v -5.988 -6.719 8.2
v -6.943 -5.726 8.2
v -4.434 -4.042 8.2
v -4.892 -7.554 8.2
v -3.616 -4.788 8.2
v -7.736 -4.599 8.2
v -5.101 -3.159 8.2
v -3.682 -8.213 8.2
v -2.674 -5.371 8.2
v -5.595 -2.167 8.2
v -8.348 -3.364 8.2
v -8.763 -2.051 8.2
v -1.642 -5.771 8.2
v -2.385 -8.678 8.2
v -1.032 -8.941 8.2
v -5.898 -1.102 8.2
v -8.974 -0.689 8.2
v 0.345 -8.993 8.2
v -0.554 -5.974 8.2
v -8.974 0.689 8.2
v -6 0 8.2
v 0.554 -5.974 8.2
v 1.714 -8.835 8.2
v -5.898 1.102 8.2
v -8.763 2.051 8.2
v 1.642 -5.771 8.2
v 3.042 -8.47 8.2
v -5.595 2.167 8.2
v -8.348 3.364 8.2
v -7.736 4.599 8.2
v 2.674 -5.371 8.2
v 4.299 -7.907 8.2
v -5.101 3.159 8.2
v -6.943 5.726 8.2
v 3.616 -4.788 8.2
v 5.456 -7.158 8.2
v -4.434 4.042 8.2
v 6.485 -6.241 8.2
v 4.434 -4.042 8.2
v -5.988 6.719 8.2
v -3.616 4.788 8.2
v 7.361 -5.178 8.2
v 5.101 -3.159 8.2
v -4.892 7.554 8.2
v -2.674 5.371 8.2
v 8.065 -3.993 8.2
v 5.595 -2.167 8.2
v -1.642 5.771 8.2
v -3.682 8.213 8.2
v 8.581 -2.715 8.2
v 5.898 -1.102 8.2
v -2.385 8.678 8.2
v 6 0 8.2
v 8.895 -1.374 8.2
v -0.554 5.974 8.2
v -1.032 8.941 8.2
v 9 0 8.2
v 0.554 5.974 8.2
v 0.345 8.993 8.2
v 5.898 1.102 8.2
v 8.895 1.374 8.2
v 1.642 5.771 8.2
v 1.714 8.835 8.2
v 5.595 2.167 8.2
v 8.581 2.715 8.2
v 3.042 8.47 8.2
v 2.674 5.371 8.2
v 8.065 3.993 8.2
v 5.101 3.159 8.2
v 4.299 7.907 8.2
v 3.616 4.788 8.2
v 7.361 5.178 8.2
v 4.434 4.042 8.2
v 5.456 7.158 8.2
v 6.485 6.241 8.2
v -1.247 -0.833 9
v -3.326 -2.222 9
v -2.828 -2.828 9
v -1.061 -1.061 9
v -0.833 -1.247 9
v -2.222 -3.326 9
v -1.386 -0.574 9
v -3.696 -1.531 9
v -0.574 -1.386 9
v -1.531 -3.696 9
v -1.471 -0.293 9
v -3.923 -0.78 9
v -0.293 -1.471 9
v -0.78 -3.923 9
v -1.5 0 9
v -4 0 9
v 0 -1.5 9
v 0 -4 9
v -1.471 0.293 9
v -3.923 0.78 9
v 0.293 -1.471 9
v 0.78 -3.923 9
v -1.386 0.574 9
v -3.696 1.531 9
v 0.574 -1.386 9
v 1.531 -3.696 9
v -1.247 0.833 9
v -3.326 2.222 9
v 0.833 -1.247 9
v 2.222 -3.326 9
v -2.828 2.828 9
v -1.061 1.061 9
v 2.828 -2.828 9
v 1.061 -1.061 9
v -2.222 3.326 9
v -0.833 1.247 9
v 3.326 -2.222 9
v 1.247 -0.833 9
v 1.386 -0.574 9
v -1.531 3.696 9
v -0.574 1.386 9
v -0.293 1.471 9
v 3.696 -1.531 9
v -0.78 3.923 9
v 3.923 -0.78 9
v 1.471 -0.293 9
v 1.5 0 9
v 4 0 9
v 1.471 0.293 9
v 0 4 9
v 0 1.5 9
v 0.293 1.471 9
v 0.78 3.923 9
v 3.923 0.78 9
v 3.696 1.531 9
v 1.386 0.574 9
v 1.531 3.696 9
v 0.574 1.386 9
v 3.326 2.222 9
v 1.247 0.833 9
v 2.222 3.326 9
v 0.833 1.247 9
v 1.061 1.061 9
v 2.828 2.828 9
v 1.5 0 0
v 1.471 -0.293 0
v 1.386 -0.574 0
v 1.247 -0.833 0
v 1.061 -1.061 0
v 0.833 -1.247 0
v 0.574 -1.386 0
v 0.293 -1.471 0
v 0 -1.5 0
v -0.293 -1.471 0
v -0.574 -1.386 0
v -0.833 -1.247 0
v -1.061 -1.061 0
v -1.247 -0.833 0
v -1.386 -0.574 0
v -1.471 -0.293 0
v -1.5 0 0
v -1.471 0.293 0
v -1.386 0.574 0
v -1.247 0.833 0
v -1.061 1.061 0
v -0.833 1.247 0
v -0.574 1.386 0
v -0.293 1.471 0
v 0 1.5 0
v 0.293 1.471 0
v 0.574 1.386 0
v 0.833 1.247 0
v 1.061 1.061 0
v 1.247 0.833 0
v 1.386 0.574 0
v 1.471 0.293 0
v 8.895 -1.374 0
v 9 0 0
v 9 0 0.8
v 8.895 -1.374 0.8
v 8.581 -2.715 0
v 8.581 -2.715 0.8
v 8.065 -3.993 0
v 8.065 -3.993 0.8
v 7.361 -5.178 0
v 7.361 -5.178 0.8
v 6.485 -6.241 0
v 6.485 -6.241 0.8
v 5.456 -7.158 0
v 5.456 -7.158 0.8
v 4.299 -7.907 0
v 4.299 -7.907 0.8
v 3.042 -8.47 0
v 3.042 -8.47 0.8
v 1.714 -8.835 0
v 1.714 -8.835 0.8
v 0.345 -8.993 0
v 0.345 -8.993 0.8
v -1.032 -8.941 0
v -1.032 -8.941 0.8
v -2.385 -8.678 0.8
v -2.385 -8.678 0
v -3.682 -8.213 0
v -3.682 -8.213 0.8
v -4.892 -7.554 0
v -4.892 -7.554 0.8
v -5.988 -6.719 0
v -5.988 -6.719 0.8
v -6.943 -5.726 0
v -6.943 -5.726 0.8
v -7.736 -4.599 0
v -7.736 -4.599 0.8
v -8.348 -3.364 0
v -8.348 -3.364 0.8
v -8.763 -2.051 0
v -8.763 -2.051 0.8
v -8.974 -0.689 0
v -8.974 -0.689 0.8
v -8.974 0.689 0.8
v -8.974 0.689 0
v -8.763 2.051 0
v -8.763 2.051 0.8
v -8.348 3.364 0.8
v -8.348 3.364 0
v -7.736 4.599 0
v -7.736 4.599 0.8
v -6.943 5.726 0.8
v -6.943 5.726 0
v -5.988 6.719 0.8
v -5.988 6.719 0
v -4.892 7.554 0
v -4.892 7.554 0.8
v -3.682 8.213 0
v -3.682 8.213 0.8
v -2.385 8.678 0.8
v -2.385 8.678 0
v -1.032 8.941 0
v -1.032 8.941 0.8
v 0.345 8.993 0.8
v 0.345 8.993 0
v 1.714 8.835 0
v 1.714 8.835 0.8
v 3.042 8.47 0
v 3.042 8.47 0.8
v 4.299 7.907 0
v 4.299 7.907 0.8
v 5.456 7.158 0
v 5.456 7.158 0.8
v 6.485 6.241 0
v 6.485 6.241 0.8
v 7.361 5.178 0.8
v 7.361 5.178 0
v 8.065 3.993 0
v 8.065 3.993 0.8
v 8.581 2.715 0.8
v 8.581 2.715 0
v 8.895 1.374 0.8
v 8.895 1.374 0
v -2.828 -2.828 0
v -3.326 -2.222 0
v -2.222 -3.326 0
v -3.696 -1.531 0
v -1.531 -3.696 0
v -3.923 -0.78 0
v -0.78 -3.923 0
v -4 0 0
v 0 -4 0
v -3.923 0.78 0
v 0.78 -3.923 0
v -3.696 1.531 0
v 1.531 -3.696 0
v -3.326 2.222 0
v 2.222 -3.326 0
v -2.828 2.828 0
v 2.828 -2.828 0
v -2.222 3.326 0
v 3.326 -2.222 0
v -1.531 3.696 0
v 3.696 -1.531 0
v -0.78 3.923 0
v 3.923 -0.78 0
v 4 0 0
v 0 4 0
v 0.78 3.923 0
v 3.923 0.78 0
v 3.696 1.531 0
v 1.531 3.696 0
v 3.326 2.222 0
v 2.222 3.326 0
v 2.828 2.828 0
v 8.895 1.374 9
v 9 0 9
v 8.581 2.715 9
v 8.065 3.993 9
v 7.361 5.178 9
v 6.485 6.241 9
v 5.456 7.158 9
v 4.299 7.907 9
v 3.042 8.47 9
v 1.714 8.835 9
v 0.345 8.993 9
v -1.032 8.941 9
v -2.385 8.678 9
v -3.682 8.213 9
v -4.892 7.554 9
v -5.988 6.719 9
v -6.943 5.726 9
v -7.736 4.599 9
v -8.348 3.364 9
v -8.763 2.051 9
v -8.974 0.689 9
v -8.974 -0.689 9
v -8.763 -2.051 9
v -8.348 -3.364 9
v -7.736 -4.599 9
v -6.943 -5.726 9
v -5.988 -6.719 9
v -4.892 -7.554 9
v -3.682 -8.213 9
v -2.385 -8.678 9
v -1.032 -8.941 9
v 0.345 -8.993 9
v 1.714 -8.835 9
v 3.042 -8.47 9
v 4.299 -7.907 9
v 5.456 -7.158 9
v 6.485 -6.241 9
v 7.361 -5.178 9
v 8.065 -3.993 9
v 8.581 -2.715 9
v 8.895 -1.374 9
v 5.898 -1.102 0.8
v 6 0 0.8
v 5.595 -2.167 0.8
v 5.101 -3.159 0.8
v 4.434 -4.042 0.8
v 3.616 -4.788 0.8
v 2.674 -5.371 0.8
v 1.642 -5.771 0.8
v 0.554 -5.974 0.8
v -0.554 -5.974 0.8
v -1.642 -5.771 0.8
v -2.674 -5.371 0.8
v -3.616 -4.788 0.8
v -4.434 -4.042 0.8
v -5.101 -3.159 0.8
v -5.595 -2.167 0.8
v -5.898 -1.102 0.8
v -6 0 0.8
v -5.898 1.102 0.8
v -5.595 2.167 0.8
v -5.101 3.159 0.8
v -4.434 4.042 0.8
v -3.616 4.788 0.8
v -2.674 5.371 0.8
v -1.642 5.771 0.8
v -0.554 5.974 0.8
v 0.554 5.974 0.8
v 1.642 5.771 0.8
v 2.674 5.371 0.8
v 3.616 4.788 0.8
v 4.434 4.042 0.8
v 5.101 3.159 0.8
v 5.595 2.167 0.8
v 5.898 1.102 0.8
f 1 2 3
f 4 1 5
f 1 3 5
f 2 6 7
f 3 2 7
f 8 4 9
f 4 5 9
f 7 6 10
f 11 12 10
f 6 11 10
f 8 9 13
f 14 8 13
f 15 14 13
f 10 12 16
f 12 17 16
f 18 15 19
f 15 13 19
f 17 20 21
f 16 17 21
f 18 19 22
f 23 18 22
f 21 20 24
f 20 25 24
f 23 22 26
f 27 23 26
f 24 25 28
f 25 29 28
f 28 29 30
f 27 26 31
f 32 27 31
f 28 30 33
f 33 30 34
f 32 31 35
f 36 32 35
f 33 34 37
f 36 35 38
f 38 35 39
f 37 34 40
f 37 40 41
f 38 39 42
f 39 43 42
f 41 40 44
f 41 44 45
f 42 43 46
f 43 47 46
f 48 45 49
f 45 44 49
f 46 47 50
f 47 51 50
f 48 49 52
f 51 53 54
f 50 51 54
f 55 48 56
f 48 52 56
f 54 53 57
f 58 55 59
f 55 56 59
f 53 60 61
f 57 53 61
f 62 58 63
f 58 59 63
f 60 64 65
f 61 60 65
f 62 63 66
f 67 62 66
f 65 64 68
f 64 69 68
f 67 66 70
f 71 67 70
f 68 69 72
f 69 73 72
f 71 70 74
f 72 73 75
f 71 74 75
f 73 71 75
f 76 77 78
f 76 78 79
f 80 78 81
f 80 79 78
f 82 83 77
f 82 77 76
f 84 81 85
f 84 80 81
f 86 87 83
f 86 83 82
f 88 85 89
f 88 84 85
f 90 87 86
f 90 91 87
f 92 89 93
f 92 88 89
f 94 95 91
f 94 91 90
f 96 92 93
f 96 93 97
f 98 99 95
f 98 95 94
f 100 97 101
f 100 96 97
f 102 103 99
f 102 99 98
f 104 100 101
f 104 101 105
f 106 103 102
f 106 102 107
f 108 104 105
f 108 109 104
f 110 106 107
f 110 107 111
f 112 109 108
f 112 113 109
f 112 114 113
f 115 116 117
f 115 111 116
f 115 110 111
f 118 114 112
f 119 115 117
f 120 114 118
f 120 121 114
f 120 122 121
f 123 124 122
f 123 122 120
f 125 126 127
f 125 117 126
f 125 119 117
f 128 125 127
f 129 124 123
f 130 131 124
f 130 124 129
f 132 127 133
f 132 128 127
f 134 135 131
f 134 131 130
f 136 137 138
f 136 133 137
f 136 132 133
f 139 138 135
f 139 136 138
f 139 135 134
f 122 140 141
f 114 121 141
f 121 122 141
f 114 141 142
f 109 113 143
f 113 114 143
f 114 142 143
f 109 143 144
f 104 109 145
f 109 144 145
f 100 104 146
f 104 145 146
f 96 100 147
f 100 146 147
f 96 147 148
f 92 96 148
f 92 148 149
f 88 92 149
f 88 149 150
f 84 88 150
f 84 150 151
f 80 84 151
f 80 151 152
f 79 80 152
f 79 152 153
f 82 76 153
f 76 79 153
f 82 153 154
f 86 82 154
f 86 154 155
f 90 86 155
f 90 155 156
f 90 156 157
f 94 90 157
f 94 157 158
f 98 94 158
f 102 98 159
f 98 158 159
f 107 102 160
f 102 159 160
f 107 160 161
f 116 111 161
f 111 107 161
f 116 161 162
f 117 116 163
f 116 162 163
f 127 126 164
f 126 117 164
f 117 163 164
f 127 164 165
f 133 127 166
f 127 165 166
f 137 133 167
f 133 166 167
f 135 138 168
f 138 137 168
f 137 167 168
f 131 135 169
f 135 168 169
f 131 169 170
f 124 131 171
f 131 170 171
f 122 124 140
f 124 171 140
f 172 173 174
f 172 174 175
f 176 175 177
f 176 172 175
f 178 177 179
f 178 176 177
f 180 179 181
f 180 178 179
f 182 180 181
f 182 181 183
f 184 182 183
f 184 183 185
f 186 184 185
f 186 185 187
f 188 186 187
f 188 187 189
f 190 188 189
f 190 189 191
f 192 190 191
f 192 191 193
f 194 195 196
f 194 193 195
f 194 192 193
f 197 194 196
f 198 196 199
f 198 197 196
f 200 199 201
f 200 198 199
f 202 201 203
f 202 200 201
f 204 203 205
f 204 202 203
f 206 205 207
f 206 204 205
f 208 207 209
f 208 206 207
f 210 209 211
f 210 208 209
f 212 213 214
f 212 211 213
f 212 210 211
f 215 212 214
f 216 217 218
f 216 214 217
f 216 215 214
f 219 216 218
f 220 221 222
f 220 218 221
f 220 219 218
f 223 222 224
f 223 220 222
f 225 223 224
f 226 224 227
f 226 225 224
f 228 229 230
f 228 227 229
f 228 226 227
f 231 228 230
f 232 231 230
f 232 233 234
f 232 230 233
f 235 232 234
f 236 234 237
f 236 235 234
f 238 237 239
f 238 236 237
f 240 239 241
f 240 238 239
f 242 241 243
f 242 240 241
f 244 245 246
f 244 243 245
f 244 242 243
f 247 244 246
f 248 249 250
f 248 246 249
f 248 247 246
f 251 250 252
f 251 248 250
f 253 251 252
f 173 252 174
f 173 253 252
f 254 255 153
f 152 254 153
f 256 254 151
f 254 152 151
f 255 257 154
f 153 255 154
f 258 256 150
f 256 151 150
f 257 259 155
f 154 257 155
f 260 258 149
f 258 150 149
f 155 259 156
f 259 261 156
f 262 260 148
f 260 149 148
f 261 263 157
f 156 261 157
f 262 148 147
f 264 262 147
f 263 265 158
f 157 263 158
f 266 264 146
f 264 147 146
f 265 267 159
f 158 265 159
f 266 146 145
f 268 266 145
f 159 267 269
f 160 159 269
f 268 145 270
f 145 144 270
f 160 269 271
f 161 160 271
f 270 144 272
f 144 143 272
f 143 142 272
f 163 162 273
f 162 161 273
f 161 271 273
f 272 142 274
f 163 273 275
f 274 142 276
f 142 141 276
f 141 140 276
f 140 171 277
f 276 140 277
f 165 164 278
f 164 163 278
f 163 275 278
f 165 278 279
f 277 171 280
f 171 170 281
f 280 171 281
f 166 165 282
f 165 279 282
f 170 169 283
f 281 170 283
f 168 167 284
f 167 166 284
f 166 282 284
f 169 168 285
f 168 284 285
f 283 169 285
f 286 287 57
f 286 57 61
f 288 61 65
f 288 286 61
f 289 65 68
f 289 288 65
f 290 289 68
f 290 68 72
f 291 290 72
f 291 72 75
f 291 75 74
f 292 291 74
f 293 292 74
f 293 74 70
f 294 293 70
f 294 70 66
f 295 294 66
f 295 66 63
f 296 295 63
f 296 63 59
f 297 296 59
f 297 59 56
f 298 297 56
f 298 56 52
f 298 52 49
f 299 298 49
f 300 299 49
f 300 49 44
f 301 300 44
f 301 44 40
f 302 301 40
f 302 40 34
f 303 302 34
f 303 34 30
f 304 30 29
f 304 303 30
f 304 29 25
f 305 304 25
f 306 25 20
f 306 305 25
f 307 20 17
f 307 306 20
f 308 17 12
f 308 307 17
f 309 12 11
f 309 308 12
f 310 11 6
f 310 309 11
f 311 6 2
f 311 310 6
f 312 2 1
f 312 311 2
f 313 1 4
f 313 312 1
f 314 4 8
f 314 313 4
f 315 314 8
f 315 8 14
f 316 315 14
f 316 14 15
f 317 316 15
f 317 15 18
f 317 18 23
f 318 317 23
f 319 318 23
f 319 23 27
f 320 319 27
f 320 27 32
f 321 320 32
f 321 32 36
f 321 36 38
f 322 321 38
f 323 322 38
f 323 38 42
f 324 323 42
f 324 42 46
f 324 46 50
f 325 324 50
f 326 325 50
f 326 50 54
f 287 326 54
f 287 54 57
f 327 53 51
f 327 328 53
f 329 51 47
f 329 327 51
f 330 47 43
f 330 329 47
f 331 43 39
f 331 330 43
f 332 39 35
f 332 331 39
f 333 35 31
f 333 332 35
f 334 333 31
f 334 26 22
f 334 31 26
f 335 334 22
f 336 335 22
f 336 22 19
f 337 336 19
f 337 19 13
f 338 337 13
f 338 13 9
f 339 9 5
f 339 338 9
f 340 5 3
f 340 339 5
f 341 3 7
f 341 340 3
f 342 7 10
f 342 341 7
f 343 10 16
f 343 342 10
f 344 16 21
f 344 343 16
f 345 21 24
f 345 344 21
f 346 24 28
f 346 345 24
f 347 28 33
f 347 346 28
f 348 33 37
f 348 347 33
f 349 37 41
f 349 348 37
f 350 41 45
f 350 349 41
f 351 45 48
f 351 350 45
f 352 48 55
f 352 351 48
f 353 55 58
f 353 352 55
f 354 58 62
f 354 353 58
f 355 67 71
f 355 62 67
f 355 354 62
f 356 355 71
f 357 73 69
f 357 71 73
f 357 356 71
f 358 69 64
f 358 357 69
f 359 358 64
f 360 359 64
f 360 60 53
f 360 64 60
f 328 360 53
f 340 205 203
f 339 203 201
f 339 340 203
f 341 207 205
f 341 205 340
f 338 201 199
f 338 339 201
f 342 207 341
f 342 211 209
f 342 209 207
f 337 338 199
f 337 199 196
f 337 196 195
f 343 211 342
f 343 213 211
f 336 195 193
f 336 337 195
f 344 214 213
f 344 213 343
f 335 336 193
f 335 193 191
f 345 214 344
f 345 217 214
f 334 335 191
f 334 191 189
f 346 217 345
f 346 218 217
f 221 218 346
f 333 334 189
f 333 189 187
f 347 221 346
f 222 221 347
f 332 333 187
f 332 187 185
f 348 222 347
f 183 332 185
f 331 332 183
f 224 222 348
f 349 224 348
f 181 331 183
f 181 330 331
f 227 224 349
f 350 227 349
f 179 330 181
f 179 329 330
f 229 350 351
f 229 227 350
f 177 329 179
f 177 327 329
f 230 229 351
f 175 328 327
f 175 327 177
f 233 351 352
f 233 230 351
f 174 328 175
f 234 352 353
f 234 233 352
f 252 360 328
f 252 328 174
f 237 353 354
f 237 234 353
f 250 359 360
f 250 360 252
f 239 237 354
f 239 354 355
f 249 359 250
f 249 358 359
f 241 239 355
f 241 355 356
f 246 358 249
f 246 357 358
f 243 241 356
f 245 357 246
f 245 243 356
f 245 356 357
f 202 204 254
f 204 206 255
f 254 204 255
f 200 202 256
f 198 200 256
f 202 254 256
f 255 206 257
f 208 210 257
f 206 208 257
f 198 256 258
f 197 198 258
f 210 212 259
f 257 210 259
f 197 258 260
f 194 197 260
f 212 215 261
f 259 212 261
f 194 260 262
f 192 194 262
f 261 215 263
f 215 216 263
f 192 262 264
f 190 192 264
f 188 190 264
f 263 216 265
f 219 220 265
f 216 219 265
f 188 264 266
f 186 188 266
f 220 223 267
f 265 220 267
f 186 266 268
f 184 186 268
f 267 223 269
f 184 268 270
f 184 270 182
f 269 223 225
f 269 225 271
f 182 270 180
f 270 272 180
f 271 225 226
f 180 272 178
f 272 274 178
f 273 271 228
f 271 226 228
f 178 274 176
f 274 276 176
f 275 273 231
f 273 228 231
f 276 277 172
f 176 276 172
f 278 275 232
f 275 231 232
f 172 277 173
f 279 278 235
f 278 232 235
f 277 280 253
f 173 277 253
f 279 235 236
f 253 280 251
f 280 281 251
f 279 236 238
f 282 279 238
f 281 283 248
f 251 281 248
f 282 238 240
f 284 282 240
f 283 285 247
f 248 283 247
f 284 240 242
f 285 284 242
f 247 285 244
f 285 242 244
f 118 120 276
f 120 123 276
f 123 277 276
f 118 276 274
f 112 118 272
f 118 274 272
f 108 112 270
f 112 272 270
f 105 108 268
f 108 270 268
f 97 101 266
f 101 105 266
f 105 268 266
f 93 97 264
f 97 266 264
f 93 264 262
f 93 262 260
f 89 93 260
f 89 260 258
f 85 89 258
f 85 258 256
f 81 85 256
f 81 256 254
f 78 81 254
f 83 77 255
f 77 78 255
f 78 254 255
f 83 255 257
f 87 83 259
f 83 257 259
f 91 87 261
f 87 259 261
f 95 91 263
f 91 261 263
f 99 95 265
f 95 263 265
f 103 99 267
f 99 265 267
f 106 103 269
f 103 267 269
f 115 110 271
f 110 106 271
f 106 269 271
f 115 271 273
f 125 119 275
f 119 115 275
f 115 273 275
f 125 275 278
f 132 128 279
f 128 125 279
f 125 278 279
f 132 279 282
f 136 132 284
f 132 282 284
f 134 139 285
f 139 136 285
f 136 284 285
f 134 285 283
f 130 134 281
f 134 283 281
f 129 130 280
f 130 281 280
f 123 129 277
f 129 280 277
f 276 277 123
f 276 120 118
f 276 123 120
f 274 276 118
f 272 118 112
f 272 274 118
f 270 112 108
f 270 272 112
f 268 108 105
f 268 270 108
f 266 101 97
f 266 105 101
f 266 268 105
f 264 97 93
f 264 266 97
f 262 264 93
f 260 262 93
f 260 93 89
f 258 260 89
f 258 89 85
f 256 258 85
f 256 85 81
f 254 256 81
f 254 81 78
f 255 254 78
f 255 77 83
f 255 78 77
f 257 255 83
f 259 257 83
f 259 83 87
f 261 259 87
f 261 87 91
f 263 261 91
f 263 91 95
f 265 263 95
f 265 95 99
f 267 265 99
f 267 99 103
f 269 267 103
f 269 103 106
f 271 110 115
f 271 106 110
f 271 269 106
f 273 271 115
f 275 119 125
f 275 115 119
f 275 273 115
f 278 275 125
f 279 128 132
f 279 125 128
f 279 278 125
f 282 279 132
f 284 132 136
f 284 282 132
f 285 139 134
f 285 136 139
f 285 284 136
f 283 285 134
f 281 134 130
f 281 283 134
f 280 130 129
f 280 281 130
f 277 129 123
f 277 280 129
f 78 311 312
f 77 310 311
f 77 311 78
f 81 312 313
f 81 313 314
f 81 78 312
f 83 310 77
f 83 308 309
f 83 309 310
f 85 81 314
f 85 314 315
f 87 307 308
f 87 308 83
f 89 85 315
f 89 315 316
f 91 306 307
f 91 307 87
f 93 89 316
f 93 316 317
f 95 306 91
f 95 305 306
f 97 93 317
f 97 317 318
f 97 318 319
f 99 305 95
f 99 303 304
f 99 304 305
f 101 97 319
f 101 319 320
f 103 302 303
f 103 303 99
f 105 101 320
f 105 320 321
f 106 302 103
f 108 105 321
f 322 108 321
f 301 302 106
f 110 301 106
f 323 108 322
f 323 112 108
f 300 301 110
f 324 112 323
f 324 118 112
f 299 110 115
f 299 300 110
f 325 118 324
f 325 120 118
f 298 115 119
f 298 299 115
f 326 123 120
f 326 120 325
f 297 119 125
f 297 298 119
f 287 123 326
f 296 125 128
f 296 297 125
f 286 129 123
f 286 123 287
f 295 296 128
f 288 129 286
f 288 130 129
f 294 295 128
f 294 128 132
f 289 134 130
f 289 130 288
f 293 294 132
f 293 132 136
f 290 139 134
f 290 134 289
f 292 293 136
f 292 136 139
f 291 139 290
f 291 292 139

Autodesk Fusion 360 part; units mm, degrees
sketch "Sketch1" plane through (0, 0, 0) normal (0, 0, 1) x (1, 0, 0)
  circle A0 centre (0, 0) radius 1.5
  circle A1 centre (0, 0) radius 4
  circle A2 centre (0, 0) radius 6
  circle A3 centre (0, 0) radius 9
  dimension "d1" = 3
  dimension "d2" = 8
  dimension "d3" = 12
  dimension "d4" = 18
extrude "Extrude1" add sketch "Sketch1" along normal blind 9 contours A1 makes body 1
extrude "Extrude2" add sketch "Sketch1" along normal blind 9 separate body contours A2 makes body 2
extrude "Extrude3" add sketch "Sketch1" along normal blind 0.8 contours A3 bodies 2
extrude "Extrude4" add sketch "Sketch1" against normal blind 0.8 from surface at 9 contours A3 bodies 2
